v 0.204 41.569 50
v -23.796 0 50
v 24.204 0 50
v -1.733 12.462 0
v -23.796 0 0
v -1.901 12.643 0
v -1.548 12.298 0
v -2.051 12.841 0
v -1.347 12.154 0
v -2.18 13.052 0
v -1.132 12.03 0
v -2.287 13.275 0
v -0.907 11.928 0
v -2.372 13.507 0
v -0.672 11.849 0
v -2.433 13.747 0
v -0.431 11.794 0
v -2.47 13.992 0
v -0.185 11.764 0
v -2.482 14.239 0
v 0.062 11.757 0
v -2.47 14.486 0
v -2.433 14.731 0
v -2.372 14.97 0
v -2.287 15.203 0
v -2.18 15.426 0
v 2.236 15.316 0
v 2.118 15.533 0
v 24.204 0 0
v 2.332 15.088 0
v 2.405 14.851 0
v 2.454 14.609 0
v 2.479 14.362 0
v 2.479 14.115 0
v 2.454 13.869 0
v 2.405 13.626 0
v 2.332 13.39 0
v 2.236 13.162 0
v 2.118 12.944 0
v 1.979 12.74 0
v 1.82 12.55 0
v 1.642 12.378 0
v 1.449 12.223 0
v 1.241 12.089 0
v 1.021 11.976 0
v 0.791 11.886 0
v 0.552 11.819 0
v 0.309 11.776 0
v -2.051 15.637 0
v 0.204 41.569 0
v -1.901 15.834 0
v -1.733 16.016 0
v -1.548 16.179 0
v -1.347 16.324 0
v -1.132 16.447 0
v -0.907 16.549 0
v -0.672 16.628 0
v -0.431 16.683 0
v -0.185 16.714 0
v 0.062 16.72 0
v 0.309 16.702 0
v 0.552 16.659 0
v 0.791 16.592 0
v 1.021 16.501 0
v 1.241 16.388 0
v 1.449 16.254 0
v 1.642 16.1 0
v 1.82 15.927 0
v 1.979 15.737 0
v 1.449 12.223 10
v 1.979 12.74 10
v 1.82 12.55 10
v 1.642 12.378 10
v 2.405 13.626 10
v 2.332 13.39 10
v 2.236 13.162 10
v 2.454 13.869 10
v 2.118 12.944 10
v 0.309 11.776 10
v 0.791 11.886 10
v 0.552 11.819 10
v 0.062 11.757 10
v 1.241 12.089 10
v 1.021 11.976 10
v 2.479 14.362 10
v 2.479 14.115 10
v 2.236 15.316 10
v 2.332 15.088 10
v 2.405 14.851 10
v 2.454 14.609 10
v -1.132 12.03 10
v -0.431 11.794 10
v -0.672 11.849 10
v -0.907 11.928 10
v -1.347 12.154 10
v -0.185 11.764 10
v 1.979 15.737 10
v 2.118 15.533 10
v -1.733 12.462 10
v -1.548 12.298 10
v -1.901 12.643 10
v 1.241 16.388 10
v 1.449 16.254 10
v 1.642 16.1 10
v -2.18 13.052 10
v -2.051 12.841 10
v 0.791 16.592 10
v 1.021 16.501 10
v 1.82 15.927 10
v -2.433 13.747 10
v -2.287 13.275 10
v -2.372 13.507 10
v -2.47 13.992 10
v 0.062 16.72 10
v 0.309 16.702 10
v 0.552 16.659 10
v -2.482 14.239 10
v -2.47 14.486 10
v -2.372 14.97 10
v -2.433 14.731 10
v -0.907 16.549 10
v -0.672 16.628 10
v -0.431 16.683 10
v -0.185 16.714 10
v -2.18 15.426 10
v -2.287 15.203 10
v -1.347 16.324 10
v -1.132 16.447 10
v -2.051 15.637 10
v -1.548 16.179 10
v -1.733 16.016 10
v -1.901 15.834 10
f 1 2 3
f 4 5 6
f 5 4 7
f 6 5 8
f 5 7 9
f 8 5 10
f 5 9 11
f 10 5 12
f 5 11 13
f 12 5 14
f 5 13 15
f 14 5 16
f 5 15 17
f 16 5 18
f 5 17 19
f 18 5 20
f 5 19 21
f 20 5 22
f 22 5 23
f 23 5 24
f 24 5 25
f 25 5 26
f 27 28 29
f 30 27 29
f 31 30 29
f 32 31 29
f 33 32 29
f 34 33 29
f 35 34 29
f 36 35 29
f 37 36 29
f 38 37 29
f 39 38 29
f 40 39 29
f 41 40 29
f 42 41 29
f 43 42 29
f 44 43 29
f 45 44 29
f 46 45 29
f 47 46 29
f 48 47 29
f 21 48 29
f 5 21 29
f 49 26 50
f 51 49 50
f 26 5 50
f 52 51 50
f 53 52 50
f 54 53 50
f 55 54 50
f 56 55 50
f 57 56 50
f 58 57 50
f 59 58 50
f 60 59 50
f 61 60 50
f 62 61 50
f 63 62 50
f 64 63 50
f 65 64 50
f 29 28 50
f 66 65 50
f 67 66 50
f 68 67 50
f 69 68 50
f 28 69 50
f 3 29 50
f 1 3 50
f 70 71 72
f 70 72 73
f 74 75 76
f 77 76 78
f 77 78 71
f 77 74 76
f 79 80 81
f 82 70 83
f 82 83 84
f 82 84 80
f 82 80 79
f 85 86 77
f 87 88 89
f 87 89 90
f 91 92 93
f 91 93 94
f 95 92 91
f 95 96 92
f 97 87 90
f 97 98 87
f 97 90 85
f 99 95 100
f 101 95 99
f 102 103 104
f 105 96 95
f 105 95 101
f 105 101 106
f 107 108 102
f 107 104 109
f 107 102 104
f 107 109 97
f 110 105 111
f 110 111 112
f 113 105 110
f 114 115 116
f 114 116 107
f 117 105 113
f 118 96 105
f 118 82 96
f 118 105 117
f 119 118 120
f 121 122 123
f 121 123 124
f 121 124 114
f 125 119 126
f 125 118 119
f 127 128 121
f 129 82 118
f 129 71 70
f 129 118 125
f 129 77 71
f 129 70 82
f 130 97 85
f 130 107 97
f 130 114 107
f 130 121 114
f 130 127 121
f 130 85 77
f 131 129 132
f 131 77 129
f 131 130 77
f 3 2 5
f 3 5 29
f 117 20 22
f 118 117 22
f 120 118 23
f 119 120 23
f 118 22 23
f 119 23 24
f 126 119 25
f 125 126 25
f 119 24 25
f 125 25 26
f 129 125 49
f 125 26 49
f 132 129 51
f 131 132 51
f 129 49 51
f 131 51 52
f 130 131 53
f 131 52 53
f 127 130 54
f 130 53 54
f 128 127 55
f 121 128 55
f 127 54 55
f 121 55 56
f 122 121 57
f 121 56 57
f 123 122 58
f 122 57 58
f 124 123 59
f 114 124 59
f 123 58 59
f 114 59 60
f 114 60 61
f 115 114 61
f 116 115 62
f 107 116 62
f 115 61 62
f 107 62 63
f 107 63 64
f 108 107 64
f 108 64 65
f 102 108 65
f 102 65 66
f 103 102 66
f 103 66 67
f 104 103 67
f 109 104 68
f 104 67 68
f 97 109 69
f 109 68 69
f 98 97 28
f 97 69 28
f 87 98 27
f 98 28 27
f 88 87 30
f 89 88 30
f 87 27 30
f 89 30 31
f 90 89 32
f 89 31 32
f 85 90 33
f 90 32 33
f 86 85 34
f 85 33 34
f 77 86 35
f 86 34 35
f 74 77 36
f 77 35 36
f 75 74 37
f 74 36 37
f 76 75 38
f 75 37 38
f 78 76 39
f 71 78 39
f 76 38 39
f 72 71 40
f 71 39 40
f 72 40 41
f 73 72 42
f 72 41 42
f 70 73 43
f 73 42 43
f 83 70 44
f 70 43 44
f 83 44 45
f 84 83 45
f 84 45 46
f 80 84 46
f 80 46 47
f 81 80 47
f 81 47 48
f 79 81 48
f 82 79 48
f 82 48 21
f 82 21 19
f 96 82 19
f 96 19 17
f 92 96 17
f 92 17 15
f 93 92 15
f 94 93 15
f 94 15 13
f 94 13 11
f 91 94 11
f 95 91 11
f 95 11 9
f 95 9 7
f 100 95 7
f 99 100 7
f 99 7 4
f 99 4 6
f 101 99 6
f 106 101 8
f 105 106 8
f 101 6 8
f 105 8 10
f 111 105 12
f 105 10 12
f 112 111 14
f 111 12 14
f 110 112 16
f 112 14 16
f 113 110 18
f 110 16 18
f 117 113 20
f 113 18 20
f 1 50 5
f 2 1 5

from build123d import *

# Parameters (mm, degrees)
SALIENTE_EXTRUIR2_DEPTH = 50
CROQUIS3_R              = 2.482100889
CORTAR_EXTRUIR1_DEPTH   = 10


with BuildPart() as part:
    # Croquis1 → Saliente-Extruir2 (new body)
    with BuildSketch(Plane.XY):
        Polygon((0.204464985, 41.569219382), (-23.795535015, 0), (24.204464985, 0), align=None)
    extrude(amount=SALIENTE_EXTRUIR2_DEPTH)

    # Croquis3 → Cortar-Extruir1 (cut)
    with BuildSketch(Plane(origin=(0, 0, 0), x_dir=(-1, 0, 0), z_dir=(0, 0, -1))):
        with Locations((0, 14.238722588)):
            Circle(CROQUIS3_R)
    extrude(amount=-CORTAR_EXTRUIR1_DEPTH, mode=Mode.SUBTRACT)


solid = part.part
